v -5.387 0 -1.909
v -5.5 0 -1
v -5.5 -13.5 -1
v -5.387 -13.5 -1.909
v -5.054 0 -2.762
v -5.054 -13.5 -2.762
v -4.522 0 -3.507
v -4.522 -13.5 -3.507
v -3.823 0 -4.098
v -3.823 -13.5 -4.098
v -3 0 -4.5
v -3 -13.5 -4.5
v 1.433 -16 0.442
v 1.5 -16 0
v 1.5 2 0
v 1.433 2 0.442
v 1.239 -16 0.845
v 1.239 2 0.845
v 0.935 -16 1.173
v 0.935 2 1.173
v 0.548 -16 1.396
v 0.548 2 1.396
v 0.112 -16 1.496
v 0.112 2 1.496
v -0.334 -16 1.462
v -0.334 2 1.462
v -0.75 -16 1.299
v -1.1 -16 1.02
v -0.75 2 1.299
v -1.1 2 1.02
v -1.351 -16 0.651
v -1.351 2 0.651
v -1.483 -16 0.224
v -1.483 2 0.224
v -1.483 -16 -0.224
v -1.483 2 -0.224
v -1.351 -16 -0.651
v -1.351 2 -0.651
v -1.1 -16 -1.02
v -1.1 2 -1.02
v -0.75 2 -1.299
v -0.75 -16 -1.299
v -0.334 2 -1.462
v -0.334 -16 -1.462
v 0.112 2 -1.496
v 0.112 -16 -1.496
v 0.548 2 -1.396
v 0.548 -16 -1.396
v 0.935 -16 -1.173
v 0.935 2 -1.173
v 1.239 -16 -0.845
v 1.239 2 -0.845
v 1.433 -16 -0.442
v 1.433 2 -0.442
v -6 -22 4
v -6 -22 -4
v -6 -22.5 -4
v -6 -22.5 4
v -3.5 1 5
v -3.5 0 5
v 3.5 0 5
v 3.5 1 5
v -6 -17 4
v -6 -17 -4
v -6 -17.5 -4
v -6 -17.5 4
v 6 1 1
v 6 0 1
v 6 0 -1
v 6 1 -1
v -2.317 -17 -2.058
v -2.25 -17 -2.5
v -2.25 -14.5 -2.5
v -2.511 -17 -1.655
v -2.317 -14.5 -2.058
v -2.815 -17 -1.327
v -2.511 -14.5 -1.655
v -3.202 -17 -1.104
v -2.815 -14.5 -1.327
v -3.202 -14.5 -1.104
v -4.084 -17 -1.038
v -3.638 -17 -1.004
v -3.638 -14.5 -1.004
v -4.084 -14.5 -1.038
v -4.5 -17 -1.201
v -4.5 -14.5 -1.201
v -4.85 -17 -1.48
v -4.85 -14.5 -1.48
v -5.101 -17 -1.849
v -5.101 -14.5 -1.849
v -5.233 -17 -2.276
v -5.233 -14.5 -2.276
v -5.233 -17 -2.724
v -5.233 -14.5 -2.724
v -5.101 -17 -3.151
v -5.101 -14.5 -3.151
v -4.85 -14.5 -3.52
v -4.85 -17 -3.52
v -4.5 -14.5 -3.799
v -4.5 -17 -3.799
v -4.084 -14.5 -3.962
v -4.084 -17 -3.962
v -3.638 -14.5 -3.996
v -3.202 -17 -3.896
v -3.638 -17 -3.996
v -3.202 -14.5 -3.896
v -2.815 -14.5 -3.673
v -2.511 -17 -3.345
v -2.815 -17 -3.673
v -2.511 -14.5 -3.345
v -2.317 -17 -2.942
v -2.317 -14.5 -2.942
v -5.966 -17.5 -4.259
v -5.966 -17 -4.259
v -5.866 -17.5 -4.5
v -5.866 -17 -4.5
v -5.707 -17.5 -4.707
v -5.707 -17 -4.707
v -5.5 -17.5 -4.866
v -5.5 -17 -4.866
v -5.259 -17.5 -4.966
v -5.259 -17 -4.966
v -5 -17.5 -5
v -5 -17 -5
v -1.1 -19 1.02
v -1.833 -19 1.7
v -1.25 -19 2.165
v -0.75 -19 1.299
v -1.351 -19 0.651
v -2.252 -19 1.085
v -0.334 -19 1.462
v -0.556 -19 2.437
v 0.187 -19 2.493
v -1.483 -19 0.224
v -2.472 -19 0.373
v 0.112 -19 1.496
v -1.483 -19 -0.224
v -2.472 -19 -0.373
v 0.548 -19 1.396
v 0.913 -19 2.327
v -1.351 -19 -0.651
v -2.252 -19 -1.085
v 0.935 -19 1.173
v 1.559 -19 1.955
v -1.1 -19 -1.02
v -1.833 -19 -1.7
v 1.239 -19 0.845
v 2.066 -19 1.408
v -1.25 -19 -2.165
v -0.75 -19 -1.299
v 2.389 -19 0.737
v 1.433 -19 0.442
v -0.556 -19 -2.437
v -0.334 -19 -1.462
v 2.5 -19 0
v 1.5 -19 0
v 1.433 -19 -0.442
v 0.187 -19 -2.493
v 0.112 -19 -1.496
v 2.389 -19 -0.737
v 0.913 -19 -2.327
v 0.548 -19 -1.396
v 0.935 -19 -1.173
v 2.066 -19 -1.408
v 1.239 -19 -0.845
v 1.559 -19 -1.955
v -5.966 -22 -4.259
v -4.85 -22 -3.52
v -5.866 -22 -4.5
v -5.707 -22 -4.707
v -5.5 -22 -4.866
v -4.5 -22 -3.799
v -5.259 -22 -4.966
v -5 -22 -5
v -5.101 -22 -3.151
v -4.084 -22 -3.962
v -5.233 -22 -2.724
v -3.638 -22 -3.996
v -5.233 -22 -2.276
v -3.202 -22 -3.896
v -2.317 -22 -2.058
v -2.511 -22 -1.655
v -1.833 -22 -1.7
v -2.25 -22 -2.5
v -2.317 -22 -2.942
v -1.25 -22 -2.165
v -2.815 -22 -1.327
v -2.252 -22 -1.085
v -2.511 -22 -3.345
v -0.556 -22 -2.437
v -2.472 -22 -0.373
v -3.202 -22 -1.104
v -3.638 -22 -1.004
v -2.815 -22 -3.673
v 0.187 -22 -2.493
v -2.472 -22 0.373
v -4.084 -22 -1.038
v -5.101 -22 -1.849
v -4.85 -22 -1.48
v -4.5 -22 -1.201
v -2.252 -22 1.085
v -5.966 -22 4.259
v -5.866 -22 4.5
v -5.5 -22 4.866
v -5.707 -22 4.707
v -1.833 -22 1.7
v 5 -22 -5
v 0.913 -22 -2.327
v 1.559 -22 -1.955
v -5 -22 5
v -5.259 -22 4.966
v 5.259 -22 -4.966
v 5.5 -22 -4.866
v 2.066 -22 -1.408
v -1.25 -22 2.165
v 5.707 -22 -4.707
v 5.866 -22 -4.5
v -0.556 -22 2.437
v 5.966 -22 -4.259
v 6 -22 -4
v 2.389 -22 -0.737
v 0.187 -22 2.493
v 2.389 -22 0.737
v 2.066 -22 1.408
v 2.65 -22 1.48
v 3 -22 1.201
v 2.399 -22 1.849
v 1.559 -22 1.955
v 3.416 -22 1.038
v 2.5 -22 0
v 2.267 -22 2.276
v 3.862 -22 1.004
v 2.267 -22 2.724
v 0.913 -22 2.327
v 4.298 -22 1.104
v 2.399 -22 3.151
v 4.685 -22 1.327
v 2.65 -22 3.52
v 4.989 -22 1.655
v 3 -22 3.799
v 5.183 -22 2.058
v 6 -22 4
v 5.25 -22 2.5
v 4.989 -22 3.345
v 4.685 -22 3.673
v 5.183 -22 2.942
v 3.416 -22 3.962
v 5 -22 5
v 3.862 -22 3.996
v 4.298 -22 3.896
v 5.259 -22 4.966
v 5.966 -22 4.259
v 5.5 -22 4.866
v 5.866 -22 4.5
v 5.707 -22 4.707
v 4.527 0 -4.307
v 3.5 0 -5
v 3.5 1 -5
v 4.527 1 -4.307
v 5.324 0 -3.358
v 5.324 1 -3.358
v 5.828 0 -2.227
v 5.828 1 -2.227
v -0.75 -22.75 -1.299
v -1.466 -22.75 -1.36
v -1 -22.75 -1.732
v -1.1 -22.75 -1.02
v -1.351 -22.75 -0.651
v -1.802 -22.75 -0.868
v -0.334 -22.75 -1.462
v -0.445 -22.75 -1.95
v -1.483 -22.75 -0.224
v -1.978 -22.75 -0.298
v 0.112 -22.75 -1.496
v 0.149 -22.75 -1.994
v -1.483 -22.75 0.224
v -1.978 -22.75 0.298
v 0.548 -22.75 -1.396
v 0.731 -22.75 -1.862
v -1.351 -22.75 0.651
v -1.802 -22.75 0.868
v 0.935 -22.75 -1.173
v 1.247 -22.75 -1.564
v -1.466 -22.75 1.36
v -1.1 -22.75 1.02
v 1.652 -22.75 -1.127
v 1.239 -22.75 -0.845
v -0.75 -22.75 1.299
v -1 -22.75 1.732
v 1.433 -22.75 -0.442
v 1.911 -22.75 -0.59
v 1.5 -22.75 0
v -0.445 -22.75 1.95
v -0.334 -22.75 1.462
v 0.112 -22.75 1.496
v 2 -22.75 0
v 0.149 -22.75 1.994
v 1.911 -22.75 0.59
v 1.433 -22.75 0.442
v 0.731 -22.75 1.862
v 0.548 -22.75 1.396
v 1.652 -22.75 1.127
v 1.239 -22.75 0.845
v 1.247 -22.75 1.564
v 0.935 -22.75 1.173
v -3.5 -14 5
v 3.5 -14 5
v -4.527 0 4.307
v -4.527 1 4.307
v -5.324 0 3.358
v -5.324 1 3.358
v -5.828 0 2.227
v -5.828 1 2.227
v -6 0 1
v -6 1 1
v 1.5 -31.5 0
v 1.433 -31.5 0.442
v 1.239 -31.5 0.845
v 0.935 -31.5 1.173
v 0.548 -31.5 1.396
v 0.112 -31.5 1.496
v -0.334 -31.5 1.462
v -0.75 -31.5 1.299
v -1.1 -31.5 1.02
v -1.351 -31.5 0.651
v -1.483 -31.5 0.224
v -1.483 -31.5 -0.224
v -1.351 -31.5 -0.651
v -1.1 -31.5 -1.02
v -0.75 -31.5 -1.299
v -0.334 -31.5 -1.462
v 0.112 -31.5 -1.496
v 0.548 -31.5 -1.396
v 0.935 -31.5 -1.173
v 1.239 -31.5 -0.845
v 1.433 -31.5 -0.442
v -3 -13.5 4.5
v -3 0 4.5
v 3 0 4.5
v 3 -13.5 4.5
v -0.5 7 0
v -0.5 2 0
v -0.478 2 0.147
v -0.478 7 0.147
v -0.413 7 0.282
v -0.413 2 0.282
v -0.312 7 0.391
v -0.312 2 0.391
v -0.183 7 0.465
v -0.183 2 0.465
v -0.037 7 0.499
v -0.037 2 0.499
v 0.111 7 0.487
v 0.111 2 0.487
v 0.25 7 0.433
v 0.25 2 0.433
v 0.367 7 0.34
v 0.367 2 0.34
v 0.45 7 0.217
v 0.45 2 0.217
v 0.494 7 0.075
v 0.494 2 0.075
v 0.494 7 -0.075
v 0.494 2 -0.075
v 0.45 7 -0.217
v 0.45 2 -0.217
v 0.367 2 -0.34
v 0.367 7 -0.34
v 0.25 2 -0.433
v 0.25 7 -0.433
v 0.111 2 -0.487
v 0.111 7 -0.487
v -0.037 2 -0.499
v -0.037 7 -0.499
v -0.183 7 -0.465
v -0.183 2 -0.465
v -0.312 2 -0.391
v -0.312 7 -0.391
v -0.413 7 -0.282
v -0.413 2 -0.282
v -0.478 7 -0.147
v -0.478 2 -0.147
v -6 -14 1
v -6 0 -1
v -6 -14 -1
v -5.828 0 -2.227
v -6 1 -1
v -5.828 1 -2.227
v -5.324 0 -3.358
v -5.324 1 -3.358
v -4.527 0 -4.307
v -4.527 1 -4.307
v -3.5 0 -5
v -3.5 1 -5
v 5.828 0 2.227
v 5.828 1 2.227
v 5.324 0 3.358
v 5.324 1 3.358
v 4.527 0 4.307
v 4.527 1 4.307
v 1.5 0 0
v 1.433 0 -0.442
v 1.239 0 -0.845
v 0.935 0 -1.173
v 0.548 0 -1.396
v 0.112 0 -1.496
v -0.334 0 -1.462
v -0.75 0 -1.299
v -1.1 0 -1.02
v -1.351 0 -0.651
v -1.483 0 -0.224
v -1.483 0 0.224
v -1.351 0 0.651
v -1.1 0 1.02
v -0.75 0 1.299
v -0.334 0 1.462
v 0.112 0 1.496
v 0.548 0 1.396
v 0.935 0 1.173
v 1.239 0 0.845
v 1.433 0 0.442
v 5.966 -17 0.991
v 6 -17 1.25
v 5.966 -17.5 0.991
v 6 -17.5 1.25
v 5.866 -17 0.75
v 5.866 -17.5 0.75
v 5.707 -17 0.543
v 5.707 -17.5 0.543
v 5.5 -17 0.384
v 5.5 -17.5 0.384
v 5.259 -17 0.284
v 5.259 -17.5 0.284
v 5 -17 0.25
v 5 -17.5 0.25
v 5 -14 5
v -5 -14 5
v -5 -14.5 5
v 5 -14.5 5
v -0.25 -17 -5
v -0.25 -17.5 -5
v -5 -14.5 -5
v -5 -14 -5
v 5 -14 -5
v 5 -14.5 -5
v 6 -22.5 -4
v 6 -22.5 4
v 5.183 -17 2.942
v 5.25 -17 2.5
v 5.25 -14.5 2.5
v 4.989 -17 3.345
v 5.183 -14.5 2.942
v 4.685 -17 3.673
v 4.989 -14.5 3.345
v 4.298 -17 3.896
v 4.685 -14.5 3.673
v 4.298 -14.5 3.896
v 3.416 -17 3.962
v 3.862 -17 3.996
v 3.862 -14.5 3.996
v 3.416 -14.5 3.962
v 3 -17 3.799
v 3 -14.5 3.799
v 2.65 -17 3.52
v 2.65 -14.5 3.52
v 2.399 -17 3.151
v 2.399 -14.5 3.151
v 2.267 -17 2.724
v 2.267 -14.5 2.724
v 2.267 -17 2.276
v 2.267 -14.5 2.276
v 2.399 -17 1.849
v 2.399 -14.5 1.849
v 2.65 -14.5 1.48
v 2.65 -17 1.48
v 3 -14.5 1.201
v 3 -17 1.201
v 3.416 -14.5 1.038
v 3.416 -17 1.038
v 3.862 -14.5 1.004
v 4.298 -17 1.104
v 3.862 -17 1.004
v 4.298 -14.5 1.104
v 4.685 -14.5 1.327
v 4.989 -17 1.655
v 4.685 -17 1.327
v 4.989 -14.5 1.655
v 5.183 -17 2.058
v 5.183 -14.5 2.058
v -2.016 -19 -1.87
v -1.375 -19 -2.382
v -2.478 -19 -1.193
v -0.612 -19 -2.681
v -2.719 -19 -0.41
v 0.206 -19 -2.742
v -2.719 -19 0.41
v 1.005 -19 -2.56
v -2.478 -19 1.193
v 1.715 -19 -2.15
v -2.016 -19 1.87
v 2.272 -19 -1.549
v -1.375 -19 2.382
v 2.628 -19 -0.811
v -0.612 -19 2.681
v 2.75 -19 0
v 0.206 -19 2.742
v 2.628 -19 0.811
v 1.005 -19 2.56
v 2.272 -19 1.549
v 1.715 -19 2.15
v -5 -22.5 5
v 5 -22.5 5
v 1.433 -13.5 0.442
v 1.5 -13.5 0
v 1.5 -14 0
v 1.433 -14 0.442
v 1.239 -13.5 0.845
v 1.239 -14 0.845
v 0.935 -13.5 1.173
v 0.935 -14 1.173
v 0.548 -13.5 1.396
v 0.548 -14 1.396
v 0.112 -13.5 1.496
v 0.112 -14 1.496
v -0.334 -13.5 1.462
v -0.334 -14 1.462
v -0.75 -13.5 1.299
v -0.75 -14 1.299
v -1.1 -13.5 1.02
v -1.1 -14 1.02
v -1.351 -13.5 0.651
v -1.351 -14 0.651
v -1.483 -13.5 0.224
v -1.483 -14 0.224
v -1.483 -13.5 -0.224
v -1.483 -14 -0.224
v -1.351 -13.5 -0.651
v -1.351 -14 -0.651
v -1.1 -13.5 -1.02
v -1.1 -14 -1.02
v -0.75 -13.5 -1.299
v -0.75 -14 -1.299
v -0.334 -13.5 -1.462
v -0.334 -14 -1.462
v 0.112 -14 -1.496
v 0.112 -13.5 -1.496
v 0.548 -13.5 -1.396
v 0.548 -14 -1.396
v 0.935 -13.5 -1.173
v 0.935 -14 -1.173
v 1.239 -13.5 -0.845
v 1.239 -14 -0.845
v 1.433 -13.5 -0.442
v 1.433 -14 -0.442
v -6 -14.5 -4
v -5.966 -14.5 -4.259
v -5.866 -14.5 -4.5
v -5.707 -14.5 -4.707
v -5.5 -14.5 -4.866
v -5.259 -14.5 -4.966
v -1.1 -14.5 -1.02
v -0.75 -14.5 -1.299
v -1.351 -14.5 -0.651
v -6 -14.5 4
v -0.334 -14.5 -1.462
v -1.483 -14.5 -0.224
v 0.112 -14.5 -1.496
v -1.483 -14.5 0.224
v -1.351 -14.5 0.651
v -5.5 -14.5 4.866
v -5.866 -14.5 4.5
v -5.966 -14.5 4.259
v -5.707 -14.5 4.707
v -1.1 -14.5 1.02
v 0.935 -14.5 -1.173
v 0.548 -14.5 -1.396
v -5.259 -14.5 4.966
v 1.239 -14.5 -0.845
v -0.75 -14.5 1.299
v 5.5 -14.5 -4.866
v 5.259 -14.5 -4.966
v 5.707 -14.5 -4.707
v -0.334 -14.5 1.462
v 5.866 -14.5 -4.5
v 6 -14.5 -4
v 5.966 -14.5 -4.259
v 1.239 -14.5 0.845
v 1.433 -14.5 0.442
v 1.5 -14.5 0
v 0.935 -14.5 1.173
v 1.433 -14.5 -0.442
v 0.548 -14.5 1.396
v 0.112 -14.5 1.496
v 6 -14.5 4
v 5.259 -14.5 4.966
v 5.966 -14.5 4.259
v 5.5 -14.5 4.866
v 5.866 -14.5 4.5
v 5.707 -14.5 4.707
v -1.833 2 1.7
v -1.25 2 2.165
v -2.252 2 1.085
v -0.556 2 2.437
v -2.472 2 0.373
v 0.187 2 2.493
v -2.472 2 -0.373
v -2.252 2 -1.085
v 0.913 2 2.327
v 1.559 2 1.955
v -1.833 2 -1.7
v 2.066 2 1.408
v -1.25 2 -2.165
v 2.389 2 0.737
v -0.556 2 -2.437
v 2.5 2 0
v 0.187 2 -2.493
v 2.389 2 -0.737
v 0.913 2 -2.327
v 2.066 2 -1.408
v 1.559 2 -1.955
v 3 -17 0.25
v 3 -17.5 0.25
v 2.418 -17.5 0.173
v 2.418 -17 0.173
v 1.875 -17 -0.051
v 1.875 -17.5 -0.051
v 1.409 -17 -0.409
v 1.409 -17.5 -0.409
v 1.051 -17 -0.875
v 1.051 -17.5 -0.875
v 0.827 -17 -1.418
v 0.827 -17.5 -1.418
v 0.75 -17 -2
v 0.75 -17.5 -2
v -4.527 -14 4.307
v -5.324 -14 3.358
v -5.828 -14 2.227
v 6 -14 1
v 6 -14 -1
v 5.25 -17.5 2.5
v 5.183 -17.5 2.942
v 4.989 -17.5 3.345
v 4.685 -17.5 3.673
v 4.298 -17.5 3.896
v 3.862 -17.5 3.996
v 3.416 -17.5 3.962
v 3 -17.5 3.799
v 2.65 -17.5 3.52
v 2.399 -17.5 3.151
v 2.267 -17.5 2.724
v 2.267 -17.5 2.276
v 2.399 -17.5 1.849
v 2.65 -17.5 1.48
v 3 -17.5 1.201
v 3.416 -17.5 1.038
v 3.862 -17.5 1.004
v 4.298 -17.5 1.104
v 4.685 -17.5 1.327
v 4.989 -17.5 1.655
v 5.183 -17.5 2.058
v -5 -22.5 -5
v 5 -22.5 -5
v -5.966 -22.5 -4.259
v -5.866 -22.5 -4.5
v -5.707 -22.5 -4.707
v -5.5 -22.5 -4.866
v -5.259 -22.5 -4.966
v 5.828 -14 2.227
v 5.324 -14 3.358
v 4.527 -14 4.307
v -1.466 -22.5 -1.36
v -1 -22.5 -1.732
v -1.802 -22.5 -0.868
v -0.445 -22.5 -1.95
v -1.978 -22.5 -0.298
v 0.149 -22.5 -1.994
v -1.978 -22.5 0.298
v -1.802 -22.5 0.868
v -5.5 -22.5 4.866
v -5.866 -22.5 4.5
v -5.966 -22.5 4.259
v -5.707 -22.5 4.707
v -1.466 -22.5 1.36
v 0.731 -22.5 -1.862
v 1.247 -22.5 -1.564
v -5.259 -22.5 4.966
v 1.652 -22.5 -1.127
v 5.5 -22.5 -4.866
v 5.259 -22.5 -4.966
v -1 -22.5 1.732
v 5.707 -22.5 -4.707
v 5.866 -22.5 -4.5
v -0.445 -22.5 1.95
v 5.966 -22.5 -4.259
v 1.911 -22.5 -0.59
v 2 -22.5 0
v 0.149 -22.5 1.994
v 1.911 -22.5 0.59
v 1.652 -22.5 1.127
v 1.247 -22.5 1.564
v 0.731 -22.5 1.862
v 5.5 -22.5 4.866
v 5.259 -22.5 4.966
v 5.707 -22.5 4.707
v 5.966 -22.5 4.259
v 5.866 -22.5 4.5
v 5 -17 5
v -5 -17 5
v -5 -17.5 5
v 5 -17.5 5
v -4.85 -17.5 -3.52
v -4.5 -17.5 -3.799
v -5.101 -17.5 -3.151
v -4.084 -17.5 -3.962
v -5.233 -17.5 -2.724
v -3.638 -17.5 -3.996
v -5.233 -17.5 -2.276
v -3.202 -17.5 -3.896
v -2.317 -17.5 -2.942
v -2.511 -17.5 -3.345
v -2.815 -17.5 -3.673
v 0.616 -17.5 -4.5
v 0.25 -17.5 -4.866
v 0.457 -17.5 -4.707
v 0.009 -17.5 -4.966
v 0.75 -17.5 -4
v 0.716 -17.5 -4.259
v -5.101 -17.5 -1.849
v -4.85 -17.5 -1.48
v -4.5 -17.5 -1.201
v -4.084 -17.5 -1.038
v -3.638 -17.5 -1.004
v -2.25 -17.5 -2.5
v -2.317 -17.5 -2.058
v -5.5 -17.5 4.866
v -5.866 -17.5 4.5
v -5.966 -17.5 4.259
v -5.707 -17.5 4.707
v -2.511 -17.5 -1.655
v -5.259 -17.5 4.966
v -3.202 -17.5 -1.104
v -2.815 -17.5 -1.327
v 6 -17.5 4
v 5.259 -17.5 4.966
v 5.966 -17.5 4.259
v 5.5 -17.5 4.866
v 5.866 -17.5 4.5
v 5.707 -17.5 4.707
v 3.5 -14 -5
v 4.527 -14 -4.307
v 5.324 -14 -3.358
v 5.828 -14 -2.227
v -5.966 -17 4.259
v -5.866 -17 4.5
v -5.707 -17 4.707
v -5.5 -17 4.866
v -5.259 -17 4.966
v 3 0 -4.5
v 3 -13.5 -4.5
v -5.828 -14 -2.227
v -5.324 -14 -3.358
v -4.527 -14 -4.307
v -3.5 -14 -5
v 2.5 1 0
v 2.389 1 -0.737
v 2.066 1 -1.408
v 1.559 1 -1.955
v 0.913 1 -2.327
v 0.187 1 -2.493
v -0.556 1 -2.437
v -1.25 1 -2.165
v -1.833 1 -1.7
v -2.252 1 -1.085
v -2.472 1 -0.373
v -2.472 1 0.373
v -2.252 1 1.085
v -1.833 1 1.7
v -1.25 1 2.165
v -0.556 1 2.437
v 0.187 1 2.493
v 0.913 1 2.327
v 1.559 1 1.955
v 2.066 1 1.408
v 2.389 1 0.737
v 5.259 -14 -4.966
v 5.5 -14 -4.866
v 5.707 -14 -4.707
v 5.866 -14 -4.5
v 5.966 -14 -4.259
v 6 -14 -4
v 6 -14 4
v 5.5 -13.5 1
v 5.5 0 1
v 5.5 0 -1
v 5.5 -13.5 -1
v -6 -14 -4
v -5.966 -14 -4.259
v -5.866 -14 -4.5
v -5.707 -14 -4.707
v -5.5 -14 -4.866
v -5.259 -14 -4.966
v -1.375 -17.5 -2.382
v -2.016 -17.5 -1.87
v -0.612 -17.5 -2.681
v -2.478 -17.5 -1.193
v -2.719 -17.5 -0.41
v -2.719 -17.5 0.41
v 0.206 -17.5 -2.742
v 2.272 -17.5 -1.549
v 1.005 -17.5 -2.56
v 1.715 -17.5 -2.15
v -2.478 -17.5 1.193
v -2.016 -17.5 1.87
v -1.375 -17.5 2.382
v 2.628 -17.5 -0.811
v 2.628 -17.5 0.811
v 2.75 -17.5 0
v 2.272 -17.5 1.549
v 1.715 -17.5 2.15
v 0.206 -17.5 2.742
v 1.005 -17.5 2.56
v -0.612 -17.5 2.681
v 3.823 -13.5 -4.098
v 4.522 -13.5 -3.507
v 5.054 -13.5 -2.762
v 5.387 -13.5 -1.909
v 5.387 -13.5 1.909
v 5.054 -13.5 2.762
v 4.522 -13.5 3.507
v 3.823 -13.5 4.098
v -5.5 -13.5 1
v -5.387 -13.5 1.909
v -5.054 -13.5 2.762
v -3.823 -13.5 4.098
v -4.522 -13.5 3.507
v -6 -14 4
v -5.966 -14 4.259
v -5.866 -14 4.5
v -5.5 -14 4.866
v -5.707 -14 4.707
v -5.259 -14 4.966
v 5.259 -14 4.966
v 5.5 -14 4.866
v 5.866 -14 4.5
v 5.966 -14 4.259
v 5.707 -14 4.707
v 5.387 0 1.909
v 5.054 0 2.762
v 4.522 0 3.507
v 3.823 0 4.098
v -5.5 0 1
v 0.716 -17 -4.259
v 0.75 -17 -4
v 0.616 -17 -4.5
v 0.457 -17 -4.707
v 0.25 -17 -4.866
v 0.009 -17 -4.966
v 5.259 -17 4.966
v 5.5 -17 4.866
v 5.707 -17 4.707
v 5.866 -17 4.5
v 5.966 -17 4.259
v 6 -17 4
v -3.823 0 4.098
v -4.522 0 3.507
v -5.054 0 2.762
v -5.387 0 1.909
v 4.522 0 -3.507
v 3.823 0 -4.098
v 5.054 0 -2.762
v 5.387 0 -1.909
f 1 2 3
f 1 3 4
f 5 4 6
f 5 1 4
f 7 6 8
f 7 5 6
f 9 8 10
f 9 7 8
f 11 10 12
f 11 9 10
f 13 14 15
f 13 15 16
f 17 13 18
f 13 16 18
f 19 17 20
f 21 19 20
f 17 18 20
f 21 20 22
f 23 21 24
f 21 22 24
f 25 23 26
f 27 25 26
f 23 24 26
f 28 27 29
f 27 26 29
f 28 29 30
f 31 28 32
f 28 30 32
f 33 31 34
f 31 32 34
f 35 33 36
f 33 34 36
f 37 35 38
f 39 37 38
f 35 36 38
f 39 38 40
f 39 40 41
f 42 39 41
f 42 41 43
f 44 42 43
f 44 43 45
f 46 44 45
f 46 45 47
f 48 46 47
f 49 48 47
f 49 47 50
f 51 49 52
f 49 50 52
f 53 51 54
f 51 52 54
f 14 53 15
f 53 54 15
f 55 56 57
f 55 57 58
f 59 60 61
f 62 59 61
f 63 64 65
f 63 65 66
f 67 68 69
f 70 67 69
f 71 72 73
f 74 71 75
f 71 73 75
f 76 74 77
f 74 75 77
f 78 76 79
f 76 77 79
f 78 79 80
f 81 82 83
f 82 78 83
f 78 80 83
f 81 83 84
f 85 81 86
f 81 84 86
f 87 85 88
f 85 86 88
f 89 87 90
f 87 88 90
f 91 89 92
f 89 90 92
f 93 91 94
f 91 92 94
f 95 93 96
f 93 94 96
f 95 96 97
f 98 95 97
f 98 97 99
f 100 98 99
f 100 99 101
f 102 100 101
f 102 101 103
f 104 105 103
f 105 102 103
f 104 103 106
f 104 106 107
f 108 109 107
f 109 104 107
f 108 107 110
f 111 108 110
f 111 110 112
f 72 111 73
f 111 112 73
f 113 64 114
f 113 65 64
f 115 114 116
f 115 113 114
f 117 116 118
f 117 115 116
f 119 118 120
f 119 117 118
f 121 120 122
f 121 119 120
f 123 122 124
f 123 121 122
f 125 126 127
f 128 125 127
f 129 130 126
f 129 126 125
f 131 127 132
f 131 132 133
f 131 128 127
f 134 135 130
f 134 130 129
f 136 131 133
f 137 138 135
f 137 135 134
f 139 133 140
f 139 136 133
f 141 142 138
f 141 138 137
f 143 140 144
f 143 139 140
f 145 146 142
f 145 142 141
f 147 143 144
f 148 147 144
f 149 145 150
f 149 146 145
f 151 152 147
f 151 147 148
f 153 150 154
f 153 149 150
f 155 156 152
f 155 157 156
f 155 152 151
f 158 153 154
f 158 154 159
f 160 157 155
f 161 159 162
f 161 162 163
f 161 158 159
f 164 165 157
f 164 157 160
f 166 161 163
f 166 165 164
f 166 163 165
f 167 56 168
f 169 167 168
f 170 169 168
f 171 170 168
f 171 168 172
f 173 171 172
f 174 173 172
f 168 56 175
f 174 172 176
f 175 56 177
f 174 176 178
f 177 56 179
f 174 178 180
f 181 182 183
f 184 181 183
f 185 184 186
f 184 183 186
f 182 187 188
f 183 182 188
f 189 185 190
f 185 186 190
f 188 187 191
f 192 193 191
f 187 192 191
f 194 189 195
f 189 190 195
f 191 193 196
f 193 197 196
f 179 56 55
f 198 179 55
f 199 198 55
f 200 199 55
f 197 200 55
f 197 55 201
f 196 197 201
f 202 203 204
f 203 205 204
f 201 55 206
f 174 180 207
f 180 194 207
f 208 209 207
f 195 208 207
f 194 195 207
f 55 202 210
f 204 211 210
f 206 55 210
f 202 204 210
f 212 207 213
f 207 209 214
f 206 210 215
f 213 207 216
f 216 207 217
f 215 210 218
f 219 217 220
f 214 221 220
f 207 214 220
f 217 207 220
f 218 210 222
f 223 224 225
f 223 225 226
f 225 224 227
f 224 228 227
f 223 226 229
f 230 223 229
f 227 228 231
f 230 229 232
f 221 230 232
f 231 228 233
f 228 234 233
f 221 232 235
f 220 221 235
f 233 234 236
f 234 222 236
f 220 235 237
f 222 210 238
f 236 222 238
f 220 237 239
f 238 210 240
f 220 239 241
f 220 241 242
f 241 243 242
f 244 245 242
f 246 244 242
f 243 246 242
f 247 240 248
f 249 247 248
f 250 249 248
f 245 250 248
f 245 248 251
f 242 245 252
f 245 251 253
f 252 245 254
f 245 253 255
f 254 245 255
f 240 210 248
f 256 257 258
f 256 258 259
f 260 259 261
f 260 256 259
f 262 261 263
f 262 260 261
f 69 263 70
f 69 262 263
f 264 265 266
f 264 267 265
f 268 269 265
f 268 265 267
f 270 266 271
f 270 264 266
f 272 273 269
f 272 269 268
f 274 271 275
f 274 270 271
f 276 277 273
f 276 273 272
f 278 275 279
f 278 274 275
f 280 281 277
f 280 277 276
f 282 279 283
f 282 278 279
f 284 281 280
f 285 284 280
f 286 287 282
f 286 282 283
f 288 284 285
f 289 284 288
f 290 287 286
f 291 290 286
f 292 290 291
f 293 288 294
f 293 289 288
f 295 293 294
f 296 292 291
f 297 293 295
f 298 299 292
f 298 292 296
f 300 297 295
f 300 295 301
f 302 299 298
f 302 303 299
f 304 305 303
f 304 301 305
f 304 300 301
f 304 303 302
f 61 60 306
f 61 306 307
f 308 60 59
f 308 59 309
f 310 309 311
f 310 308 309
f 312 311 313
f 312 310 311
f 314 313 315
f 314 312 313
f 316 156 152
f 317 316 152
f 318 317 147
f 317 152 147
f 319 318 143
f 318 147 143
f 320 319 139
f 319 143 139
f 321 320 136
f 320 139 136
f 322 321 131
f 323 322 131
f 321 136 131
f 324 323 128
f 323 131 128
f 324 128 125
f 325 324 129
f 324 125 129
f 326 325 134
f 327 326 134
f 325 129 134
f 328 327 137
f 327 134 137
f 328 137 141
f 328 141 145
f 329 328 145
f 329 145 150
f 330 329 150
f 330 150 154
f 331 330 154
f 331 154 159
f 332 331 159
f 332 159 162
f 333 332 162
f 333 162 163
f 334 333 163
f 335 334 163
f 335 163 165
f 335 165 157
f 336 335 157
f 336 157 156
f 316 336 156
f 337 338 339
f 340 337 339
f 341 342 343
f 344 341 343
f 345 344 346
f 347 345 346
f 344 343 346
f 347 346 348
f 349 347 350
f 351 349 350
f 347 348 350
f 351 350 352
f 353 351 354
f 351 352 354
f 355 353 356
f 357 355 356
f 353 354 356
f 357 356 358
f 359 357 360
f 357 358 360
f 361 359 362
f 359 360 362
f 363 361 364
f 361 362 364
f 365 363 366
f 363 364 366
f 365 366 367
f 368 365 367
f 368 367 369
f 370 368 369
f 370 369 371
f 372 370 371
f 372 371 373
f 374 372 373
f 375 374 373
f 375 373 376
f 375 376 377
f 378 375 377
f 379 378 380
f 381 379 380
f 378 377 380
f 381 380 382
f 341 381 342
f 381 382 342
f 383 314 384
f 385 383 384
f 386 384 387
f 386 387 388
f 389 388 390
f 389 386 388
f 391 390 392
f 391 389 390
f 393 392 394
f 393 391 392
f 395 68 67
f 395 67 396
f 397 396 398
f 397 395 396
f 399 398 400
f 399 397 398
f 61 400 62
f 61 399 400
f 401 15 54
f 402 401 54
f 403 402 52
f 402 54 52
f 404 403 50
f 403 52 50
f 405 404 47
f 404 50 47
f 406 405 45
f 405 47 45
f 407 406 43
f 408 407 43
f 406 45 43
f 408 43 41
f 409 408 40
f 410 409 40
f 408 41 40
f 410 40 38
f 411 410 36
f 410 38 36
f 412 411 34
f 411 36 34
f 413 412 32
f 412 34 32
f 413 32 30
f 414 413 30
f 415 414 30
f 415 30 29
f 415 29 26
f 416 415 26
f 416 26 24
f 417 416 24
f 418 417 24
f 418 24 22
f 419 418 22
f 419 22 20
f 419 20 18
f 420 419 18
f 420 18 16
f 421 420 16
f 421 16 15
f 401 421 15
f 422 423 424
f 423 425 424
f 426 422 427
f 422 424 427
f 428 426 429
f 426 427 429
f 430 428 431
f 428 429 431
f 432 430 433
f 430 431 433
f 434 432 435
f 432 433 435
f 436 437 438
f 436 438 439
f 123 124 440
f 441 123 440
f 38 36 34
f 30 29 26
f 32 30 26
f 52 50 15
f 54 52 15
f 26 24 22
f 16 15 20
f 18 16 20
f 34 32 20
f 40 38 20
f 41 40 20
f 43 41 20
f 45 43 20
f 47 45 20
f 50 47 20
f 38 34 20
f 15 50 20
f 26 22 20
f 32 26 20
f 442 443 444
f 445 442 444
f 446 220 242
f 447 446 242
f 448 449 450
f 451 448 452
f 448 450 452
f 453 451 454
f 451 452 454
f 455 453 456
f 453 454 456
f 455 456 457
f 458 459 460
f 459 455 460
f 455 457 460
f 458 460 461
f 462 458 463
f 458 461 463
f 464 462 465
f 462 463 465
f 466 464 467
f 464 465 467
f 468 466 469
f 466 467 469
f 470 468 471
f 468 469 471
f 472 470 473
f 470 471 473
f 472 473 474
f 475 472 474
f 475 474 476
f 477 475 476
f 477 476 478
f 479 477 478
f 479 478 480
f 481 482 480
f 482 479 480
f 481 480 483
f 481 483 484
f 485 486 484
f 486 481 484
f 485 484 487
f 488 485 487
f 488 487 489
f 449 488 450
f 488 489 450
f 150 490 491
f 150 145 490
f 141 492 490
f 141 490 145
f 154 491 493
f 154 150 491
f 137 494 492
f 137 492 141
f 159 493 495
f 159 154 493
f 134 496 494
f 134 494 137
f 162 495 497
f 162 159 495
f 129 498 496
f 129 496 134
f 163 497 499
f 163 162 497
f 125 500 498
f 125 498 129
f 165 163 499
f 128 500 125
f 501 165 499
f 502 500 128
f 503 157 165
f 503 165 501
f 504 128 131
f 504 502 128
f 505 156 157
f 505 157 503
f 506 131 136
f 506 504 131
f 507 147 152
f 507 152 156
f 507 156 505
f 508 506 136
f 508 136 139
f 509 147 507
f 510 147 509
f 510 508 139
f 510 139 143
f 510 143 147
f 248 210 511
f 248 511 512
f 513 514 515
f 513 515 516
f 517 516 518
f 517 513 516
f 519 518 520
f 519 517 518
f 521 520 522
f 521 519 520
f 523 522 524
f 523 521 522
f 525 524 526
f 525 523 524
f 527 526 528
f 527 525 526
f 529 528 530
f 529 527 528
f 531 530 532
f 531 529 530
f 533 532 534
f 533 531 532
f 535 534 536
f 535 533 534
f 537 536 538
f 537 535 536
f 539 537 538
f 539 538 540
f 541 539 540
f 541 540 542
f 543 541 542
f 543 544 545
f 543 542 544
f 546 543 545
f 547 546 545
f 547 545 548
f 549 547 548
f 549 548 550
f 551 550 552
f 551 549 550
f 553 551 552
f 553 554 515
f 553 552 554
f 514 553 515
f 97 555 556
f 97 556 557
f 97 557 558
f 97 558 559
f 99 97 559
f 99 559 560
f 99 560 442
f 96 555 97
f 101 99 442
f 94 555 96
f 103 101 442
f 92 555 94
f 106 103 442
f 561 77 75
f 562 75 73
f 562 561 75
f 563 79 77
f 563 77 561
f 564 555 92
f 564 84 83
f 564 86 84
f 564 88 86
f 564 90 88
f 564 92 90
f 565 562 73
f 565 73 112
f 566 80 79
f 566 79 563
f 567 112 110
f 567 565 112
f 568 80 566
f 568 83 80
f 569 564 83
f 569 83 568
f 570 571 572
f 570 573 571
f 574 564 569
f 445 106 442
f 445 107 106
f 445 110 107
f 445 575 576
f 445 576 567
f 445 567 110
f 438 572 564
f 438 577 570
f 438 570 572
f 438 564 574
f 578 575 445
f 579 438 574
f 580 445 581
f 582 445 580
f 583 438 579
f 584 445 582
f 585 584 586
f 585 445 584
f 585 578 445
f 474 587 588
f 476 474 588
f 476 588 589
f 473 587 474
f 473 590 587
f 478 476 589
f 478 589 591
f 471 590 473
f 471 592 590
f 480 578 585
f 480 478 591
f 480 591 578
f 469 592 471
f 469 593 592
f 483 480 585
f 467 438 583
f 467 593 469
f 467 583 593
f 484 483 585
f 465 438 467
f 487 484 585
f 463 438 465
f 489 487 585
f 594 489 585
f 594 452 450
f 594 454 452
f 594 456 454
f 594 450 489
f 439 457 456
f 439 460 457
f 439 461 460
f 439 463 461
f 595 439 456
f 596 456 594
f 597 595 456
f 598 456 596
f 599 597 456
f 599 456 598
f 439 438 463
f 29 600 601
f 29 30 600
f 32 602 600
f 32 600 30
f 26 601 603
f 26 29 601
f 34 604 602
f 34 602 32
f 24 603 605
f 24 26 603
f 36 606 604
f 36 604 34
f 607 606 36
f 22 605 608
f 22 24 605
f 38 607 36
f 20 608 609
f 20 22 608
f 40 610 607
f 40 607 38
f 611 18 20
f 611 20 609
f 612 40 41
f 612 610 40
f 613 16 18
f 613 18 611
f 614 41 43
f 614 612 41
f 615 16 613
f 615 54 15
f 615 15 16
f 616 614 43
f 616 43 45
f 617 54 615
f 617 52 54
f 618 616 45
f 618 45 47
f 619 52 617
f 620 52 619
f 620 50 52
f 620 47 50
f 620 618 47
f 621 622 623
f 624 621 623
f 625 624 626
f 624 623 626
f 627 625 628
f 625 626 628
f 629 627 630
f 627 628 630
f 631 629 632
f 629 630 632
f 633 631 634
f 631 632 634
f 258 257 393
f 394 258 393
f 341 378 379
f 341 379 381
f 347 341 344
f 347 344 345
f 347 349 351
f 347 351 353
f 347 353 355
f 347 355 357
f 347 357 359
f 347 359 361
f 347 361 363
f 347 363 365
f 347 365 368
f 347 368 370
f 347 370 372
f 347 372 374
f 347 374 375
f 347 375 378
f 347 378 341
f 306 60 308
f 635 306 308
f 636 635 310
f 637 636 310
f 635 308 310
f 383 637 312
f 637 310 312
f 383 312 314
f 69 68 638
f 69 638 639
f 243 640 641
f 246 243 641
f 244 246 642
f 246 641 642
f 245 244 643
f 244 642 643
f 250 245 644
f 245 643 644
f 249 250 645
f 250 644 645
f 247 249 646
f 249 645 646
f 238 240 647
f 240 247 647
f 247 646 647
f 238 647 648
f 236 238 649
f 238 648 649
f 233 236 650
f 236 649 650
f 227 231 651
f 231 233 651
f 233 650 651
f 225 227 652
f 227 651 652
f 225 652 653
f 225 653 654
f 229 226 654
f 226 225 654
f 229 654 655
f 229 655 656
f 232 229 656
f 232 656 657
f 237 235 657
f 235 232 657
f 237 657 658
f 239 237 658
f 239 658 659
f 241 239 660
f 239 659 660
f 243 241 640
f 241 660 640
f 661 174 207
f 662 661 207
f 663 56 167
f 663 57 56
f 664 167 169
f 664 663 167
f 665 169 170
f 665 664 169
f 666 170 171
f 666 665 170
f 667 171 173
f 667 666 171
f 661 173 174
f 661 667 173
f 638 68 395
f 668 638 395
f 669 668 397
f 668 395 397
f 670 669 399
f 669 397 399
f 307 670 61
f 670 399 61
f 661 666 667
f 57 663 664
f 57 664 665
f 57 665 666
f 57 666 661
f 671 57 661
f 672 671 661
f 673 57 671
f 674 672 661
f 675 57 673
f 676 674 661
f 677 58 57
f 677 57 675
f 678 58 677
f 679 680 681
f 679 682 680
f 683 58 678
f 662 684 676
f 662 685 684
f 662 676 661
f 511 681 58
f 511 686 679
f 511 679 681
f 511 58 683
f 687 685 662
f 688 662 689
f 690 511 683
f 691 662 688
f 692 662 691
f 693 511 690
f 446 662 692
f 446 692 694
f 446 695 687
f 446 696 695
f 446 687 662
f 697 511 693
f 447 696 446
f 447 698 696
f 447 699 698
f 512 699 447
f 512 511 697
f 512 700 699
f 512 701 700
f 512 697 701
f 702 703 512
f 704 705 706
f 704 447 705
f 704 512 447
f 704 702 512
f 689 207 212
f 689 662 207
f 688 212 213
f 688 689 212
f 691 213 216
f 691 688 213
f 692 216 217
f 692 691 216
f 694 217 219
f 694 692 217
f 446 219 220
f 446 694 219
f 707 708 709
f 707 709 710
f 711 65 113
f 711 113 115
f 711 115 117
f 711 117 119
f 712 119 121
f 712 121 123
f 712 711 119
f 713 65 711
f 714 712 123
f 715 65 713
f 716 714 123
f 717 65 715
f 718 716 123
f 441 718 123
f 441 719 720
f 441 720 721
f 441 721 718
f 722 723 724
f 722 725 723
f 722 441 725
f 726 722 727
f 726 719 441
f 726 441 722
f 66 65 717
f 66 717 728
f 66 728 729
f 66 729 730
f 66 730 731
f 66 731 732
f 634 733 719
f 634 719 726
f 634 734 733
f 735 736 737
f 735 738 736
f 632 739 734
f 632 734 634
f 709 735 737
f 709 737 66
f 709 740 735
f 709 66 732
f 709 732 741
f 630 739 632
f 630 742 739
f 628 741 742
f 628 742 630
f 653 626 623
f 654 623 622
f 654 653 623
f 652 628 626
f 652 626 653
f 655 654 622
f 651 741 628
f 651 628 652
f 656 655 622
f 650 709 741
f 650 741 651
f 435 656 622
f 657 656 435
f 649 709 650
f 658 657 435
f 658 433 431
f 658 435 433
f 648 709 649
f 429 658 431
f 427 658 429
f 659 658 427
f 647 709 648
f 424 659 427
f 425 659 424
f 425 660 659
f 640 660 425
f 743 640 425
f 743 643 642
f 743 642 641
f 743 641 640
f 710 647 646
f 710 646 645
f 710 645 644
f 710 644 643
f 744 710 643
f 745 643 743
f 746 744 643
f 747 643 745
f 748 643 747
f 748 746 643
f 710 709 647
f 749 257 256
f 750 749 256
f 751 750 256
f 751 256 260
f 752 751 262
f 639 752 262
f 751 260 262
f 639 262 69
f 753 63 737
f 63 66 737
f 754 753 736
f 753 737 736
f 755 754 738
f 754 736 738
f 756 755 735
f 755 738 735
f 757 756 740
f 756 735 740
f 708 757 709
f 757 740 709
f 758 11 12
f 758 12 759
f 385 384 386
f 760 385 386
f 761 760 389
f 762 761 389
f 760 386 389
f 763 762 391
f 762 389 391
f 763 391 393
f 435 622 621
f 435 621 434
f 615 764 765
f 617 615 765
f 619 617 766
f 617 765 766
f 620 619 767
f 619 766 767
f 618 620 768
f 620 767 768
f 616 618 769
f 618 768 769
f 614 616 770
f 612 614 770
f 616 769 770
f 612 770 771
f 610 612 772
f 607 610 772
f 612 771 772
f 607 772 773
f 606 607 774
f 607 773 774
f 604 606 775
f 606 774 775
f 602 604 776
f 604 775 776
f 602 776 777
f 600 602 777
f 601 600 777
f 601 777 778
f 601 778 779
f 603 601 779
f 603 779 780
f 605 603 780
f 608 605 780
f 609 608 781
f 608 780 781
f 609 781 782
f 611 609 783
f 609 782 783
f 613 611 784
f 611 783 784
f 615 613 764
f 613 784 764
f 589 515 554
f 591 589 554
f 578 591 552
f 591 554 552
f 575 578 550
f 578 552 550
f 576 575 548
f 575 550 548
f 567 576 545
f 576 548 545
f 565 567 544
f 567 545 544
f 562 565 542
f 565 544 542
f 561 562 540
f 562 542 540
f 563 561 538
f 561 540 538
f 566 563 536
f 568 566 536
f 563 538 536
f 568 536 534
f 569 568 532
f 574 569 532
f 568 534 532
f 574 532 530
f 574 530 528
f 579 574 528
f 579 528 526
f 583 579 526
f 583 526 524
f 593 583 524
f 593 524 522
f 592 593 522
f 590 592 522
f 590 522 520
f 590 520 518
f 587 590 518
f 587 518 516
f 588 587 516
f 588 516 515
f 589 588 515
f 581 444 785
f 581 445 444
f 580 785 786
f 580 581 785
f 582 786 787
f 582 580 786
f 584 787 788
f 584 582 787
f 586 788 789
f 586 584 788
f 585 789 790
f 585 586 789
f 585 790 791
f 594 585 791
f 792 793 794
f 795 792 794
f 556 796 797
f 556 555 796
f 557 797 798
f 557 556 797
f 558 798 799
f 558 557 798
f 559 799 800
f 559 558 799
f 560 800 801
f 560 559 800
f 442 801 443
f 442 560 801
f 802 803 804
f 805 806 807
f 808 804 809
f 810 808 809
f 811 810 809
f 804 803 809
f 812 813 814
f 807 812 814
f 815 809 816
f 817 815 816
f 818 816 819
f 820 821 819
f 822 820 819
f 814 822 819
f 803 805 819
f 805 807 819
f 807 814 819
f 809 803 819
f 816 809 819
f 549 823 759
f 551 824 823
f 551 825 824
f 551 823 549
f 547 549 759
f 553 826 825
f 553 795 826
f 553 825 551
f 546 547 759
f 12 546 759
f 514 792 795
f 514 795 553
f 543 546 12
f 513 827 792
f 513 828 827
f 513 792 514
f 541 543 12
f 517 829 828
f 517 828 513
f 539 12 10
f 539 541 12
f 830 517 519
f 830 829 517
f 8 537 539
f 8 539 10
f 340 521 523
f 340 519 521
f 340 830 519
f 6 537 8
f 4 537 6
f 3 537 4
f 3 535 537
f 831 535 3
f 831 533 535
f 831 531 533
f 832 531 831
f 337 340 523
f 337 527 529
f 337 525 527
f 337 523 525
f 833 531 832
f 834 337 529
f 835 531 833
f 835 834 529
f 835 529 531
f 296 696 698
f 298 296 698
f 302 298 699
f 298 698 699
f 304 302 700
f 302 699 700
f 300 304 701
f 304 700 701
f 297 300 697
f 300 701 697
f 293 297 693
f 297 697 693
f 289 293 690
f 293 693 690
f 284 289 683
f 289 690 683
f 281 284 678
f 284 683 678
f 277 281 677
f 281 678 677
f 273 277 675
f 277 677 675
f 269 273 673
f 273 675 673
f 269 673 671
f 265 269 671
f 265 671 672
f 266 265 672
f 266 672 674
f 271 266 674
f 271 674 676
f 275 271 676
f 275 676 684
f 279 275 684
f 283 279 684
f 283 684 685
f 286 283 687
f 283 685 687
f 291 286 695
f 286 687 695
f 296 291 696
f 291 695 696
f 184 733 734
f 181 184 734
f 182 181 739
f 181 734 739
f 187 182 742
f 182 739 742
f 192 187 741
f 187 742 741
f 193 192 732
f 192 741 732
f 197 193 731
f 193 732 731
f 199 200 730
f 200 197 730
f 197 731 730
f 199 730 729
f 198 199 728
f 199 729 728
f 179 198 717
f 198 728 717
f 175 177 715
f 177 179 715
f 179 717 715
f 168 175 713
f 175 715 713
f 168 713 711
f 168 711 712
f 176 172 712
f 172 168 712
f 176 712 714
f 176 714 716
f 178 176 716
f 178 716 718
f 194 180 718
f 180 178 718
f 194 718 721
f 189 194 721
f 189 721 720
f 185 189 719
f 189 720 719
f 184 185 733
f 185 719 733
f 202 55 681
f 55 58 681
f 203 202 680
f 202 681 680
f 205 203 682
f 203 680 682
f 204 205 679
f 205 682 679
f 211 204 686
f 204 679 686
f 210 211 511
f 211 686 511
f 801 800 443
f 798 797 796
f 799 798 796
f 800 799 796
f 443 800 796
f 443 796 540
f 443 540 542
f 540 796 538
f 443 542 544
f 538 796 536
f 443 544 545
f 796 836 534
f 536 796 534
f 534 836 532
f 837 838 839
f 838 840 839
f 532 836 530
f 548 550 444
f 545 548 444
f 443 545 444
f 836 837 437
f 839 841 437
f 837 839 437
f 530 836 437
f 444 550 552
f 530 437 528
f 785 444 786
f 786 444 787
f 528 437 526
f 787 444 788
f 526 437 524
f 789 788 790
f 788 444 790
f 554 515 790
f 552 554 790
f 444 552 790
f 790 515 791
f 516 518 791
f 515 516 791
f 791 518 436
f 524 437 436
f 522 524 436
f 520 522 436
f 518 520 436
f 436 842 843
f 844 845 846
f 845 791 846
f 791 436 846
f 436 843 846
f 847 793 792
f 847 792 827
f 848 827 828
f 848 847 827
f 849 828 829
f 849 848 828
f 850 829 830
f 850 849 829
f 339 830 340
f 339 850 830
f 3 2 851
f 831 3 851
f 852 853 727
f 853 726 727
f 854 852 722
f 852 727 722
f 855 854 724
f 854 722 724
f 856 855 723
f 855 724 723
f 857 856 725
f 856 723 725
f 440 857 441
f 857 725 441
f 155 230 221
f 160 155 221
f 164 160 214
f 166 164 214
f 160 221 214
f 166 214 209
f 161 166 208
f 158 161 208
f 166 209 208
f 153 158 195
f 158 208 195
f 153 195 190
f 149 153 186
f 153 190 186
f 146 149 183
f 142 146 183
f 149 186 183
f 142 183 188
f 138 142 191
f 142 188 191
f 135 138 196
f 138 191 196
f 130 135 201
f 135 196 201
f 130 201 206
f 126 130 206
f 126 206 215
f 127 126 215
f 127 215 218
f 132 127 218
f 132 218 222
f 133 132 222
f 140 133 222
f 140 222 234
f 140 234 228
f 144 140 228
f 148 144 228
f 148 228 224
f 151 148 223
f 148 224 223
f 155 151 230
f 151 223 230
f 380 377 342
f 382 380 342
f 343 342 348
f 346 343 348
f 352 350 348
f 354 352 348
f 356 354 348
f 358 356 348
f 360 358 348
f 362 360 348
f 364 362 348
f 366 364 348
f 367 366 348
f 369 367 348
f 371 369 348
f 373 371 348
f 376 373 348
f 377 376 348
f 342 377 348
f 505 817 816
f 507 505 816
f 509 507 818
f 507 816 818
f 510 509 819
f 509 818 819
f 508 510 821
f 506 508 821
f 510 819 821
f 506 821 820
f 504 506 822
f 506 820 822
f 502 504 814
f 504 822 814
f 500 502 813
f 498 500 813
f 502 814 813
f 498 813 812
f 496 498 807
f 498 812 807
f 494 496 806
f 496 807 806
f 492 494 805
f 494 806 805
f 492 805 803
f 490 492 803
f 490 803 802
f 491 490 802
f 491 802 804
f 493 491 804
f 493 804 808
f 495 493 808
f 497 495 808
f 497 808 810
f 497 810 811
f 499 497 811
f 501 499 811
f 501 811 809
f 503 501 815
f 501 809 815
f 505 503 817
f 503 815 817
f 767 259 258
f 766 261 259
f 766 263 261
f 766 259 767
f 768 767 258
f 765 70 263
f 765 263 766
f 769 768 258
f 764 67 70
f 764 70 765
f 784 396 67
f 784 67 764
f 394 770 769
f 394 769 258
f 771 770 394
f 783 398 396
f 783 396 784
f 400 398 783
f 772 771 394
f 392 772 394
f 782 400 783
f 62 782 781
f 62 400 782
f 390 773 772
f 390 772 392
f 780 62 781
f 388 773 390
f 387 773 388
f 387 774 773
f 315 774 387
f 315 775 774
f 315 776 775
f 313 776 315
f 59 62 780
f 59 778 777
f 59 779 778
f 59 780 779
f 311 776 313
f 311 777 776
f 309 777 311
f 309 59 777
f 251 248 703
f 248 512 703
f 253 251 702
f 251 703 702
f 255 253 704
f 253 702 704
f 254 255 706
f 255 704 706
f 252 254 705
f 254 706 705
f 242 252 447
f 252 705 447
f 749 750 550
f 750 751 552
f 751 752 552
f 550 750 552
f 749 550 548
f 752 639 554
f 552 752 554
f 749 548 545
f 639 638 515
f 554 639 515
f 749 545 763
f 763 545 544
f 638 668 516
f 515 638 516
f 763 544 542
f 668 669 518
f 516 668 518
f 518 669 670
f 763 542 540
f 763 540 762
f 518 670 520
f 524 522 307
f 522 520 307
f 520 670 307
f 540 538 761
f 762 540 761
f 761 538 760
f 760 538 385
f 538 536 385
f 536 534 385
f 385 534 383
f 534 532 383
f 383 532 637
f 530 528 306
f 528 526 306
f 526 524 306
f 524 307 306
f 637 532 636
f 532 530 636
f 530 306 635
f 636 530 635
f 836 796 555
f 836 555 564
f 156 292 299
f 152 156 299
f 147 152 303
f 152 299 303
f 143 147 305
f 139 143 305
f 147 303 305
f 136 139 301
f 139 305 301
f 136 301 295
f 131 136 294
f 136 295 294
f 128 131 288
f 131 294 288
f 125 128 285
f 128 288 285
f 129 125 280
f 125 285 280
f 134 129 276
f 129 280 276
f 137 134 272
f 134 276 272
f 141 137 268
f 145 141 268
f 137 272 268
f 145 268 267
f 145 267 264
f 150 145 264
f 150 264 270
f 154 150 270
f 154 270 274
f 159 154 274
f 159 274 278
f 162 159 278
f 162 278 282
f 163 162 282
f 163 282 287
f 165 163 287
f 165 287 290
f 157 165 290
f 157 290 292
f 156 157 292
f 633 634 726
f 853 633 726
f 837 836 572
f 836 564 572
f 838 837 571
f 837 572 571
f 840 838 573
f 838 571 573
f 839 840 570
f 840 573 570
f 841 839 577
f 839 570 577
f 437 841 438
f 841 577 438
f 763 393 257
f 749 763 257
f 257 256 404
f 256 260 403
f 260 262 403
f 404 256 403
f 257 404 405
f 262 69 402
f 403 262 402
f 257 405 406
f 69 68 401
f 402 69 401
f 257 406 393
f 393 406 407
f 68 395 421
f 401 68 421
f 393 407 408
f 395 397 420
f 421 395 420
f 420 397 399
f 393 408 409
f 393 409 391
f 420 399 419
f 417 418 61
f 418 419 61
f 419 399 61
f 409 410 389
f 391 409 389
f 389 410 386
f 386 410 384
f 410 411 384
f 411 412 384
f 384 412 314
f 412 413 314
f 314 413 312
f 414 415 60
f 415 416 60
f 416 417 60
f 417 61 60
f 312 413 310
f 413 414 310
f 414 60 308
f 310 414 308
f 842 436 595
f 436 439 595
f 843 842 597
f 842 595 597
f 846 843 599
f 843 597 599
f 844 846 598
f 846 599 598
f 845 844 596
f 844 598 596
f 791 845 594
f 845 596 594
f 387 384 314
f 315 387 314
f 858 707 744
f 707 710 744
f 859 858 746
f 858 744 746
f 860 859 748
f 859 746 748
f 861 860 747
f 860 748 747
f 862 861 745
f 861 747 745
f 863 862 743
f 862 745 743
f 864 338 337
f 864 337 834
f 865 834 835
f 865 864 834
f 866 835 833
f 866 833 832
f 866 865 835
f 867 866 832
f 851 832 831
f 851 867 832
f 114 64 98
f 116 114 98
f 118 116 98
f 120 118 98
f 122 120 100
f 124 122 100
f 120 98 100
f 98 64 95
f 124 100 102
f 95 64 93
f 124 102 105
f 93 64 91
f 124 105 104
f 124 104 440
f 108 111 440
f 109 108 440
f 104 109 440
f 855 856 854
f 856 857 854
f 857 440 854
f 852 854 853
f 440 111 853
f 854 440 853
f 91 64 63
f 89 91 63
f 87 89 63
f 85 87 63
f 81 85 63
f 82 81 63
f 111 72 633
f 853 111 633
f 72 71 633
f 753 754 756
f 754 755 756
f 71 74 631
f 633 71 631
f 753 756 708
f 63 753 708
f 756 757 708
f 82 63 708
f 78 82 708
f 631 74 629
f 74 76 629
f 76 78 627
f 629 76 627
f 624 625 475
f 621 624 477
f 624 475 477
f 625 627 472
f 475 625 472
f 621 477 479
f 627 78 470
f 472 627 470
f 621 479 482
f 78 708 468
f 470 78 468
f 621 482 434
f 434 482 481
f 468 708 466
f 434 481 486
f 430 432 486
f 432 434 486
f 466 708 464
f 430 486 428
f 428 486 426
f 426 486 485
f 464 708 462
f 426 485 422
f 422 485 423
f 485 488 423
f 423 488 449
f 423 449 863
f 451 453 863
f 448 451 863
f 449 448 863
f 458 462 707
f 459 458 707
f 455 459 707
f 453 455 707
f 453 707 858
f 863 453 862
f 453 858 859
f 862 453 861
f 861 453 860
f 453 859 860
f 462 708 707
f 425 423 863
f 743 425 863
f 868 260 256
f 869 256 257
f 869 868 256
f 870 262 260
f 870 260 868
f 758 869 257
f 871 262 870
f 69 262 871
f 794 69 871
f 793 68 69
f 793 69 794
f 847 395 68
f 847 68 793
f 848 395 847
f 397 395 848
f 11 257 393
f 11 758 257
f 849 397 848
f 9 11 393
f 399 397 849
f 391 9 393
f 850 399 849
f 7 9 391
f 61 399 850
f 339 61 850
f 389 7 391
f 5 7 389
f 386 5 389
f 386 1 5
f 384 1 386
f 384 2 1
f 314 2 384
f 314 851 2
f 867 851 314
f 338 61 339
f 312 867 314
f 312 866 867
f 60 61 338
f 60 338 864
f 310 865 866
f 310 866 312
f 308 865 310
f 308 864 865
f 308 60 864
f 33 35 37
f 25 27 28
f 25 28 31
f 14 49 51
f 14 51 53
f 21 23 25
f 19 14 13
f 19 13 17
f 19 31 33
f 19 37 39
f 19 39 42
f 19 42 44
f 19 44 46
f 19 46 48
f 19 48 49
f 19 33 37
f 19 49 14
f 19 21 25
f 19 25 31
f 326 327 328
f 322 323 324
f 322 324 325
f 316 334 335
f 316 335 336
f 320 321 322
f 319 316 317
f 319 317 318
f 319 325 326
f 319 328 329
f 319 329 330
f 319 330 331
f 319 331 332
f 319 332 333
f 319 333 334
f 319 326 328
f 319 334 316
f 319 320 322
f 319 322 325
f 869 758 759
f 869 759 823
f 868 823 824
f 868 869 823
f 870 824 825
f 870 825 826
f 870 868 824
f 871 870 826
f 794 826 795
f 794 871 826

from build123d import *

# Parameters (mm, degrees)
PAD_DEPTH       = 14
POCKET_DEPTH    = 13.5
SKETCH002_R     = 1.5
POCKET001_DEPTH = 14.001
PAD001_DEPTH    = 1
SKETCH004_R     = 2.5
PAD002_DEPTH    = 1
SKETCH005_R     = 1.5
POCKET002_DEPTH = 2.001
SKETCH006_W     = 12
SKETCH006_H     = 10
PAD003_DEPTH    = 0.5
SKETCH007_R     = 1.5
PAD004_DEPTH    = 7.7
SKETCH008_W     = 12
SKETCH008_H     = 10
PAD005_DEPTH    = 0.5
SKETCH009_W     = 12
SKETCH009_H     = 10
PAD006_DEPTH    = 0.5
SKETCH010_R     = 2
PAD007_DEPTH    = 0.25
SKETCH011_R     = 2.5
PAD008_DEPTH    = 3
SKETCH012_R     = 1.5
POCKET003_DEPTH = 5
POCKET004_DEPTH = 1
FILLET_R        = 1
SKETCH014_R     = 1.5
POCKET005_DEPTH = 2
SKETCH015_R     = 1.5
PAD009_DEPTH    = 18
SKETCH016_R     = 1.5
PAD010_DEPTH    = 14
SKETCH017_R     = 2.75
PAD011_DEPTH    = 1.5
SKETCH021_R     = 0.5
PAD014_DEPTH    = 5


with BuildPart() as motorshell:
    # Sketch → Pad (new body)
    with BuildSketch(Plane.XZ):
        with BuildLine():
            Line((-3.5, 5), (3.5, 5))
            ThreePointArc((6, 1), (5.323594, 3.358497), (3.5, 5))
            Line((6, 1), (6, -1))
            ThreePointArc((3.5, -5), (5.323594, -3.358497), (6, -1))
            Line((-3.5, -5), (3.5, -5))
            ThreePointArc((-6, -1), (-5.323594, -3.358496), (-3.5, -5))
            Line((-6, 1), (-6, -1))
            ThreePointArc((-3.5, 5), (-5.323594, 3.358496), (-6, 1))
        make_face()
    extrude(amount=PAD_DEPTH)

    # Sketch001 → Pocket (cut)
    with BuildSketch(Plane.XZ):
        with BuildLine():
            Line((-3, 4.5), (3, 4.5))
            ThreePointArc((5.5, 1), (4.810812, 3.15058), (3, 4.5))
            Line((5.5, 1), (5.5, -1))
            ThreePointArc((3, -4.5), (4.810812, -3.15058), (5.5, -1))
            Line((-3, -4.5), (3, -4.5))
            ThreePointArc((-5.5, -1), (-4.810812, -3.15058), (-3, -4.5))
            Line((-5.5, -1), (-5.5, 1))
            ThreePointArc((-3, 4.5), (-4.810812, 3.15058), (-5.5, 1))
        make_face()
    extrude(amount=POCKET_DEPTH, mode=Mode.SUBTRACT)

    # Sketch002 → Pocket001 (cut, through all)
    with BuildSketch(Plane.XZ):
        Circle(SKETCH002_R)
    extrude(amount=POCKET001_DEPTH, mode=Mode.SUBTRACT)


with BuildPart() as backplate:
    # Sketch003 → Pad001 (new body)
    with BuildSketch(Plane.XZ):
        with BuildLine():
            Line((-3.5, 5), (3.5, 5))
            ThreePointArc((6, 1), (5.323593, 3.358495), (3.5, 5))
            Line((6, 1), (6, -1))
            ThreePointArc((3.5, -5), (5.323593, -3.358495), (6, -1))
            Line((3.5, -5), (-3.5, -5))
            ThreePointArc((-6, -1), (-5.323593, -3.358495), (-3.5, -5))
            Line((-6, -1), (-6, 1))
            ThreePointArc((-3.5, 5), (-5.323593, 3.358495), (-6, 1))
        make_face()
    extrude(amount=-PAD001_DEPTH)

    # Sketch004 (on Face10 of Pad001) → Pad002 (join)
    with BuildSketch(Plane(origin=(0, 1, 0), x_dir=(1, 0, 0), z_dir=(0, 1, 0))):
        Circle(SKETCH004_R)
    extrude(amount=PAD002_DEPTH)

    # Sketch005 (on Face12 of Pad002) → Pocket002 (cut, through all)
    with BuildSketch(Plane(origin=(0, 2, 0), x_dir=(1, 0, 0), z_dir=(0, 1, 0))):
        Circle(SKETCH005_R)
    extrude(amount=-POCKET002_DEPTH, mode=Mode.SUBTRACT)


with BuildPart() as gearplates:
    # Sketch006 (on DatumPlane) → Pad003 (new body)
    with BuildSketch(Plane.XZ.offset(14)):
        Rectangle(SKETCH006_W, SKETCH006_H)
    extrude(amount=PAD003_DEPTH)

    # Sketch007 (on Face6 of Pad003) → Pad004 (join)
    with BuildSketch(Plane.XZ.offset(14.5)):
        with Locations((3.75, 2.5)):
            Circle(SKETCH007_R)
        with Locations((-3.75, -2.5)):
            Circle(SKETCH007_R)
    extrude(amount=PAD004_DEPTH)

    # Sketch008 (on DatumPlane) → Pad005 (join)
    with BuildSketch(Plane.XZ.offset(17)):
        Rectangle(SKETCH008_W, SKETCH008_H)
    extrude(amount=PAD005_DEPTH)

    # Sketch009 (on DatumPlane) → Pad006 (join)
    with BuildSketch(Plane.XZ.offset(22)):
        Rectangle(SKETCH009_W, SKETCH009_H)
    extrude(amount=PAD006_DEPTH)

    # Sketch010 (on Face22 of Pad006) → Pad007 (join)
    with BuildSketch(Plane.XZ.offset(22.5)):
        Circle(SKETCH010_R)
    extrude(amount=PAD007_DEPTH)

    # Sketch011 (on Face17 of Pad007) → Pad008 (join)
    with BuildSketch(Plane(origin=(0, -22, 0), x_dir=(1, 0, 0), z_dir=(0, 1, 0))):
        Circle(SKETCH011_R)
    extrude(amount=PAD008_DEPTH)

    # Sketch012 (on Face26 of Pad008) → Pocket003 (cut)
    with BuildSketch(Plane.XZ.offset(22.75)):
        Circle(SKETCH012_R)
    extrude(amount=-POCKET003_DEPTH, mode=Mode.SUBTRACT)

    # Sketch013 (on Face14 of Pocket003) → Pocket004 (cut)
    with BuildSketch(Plane.XZ.offset(17.5)):
        with BuildLine():
            Line((7.000018, 0.25), (7.000018, -6))
            Line((7.000018, -6), (0.75, -6))
            Line((0.75, -2), (0.75, -6))
            ThreePointArc((3.000018, 0.25), (1.409016, -0.409003), (0.75, -2))
            Line((3.000018, 0.25), (7.000018, 0.25))
        make_face()
    extrude(amount=-POCKET004_DEPTH, mode=Mode.SUBTRACT)

    # Fillet
    fillet_edges = [gearplates.edges().sort_by_distance(p)[0] for p in [
        (6, -22.25, 5),
        (6, -17.25, 5),
        (6, -14.25, 5),
        (-6, -22.25, 5),
        (-6, -17.25, 5),
        (-6, -14.25, 5),
        (-6, -22.25, -5),
        (-6, -17.25, -5),
        (-6, -14.25, -5),
        (6, -22.25, -5),
        (6, -14.25, -5),
        (6, -17.25, 0.25),
        (0.75, -17.25, -5),
    ]]
    fillet(fillet_edges, radius=FILLET_R)

    # Sketch014 (on Face2 of Fillet) → Pocket005 (cut)
    with BuildSketch(Plane(origin=(0, -14, 0), x_dir=(1, 0, 0), z_dir=(0, 1, 0))):
        Circle(SKETCH014_R)
    extrude(amount=-POCKET005_DEPTH, mode=Mode.SUBTRACT)


with BuildPart() as motorshaft:
    # Sketch015 (on DatumPlane) → Pad009 (new body)
    with BuildSketch(Plane.XZ.offset(-2)):
        Circle(SKETCH015_R)
    extrude(amount=PAD009_DEPTH)


with BuildPart() as wheelshaft:
    # Sketch016 (on DatumPlane) → Pad010 (new body)
    with BuildSketch(Plane.XZ.offset(17.5)):
        Circle(SKETCH016_R)
    extrude(amount=PAD010_DEPTH)

    # Sketch017 (on DatumPlane) → Pad011 (join)
    with BuildSketch(Plane.XZ.offset(17.5)):
        Circle(SKETCH017_R)
    extrude(amount=PAD011_DEPTH)


with BuildPart() as extendedbackshaft:
    # Sketch021 (on Face1 of CopyPad009) → Pad014 (new body)
    with BuildSketch(Plane(origin=(0, 2, 0), x_dir=(-1, 0, 0), z_dir=(0, 1, 0))):
        Circle(SKETCH021_R)
    extrude(amount=PAD014_DEPTH)


solid = Compound([motorshell.part, backplate.part, gearplates.part, motorshaft.part, wheelshaft.part, extendedbackshaft.part])
